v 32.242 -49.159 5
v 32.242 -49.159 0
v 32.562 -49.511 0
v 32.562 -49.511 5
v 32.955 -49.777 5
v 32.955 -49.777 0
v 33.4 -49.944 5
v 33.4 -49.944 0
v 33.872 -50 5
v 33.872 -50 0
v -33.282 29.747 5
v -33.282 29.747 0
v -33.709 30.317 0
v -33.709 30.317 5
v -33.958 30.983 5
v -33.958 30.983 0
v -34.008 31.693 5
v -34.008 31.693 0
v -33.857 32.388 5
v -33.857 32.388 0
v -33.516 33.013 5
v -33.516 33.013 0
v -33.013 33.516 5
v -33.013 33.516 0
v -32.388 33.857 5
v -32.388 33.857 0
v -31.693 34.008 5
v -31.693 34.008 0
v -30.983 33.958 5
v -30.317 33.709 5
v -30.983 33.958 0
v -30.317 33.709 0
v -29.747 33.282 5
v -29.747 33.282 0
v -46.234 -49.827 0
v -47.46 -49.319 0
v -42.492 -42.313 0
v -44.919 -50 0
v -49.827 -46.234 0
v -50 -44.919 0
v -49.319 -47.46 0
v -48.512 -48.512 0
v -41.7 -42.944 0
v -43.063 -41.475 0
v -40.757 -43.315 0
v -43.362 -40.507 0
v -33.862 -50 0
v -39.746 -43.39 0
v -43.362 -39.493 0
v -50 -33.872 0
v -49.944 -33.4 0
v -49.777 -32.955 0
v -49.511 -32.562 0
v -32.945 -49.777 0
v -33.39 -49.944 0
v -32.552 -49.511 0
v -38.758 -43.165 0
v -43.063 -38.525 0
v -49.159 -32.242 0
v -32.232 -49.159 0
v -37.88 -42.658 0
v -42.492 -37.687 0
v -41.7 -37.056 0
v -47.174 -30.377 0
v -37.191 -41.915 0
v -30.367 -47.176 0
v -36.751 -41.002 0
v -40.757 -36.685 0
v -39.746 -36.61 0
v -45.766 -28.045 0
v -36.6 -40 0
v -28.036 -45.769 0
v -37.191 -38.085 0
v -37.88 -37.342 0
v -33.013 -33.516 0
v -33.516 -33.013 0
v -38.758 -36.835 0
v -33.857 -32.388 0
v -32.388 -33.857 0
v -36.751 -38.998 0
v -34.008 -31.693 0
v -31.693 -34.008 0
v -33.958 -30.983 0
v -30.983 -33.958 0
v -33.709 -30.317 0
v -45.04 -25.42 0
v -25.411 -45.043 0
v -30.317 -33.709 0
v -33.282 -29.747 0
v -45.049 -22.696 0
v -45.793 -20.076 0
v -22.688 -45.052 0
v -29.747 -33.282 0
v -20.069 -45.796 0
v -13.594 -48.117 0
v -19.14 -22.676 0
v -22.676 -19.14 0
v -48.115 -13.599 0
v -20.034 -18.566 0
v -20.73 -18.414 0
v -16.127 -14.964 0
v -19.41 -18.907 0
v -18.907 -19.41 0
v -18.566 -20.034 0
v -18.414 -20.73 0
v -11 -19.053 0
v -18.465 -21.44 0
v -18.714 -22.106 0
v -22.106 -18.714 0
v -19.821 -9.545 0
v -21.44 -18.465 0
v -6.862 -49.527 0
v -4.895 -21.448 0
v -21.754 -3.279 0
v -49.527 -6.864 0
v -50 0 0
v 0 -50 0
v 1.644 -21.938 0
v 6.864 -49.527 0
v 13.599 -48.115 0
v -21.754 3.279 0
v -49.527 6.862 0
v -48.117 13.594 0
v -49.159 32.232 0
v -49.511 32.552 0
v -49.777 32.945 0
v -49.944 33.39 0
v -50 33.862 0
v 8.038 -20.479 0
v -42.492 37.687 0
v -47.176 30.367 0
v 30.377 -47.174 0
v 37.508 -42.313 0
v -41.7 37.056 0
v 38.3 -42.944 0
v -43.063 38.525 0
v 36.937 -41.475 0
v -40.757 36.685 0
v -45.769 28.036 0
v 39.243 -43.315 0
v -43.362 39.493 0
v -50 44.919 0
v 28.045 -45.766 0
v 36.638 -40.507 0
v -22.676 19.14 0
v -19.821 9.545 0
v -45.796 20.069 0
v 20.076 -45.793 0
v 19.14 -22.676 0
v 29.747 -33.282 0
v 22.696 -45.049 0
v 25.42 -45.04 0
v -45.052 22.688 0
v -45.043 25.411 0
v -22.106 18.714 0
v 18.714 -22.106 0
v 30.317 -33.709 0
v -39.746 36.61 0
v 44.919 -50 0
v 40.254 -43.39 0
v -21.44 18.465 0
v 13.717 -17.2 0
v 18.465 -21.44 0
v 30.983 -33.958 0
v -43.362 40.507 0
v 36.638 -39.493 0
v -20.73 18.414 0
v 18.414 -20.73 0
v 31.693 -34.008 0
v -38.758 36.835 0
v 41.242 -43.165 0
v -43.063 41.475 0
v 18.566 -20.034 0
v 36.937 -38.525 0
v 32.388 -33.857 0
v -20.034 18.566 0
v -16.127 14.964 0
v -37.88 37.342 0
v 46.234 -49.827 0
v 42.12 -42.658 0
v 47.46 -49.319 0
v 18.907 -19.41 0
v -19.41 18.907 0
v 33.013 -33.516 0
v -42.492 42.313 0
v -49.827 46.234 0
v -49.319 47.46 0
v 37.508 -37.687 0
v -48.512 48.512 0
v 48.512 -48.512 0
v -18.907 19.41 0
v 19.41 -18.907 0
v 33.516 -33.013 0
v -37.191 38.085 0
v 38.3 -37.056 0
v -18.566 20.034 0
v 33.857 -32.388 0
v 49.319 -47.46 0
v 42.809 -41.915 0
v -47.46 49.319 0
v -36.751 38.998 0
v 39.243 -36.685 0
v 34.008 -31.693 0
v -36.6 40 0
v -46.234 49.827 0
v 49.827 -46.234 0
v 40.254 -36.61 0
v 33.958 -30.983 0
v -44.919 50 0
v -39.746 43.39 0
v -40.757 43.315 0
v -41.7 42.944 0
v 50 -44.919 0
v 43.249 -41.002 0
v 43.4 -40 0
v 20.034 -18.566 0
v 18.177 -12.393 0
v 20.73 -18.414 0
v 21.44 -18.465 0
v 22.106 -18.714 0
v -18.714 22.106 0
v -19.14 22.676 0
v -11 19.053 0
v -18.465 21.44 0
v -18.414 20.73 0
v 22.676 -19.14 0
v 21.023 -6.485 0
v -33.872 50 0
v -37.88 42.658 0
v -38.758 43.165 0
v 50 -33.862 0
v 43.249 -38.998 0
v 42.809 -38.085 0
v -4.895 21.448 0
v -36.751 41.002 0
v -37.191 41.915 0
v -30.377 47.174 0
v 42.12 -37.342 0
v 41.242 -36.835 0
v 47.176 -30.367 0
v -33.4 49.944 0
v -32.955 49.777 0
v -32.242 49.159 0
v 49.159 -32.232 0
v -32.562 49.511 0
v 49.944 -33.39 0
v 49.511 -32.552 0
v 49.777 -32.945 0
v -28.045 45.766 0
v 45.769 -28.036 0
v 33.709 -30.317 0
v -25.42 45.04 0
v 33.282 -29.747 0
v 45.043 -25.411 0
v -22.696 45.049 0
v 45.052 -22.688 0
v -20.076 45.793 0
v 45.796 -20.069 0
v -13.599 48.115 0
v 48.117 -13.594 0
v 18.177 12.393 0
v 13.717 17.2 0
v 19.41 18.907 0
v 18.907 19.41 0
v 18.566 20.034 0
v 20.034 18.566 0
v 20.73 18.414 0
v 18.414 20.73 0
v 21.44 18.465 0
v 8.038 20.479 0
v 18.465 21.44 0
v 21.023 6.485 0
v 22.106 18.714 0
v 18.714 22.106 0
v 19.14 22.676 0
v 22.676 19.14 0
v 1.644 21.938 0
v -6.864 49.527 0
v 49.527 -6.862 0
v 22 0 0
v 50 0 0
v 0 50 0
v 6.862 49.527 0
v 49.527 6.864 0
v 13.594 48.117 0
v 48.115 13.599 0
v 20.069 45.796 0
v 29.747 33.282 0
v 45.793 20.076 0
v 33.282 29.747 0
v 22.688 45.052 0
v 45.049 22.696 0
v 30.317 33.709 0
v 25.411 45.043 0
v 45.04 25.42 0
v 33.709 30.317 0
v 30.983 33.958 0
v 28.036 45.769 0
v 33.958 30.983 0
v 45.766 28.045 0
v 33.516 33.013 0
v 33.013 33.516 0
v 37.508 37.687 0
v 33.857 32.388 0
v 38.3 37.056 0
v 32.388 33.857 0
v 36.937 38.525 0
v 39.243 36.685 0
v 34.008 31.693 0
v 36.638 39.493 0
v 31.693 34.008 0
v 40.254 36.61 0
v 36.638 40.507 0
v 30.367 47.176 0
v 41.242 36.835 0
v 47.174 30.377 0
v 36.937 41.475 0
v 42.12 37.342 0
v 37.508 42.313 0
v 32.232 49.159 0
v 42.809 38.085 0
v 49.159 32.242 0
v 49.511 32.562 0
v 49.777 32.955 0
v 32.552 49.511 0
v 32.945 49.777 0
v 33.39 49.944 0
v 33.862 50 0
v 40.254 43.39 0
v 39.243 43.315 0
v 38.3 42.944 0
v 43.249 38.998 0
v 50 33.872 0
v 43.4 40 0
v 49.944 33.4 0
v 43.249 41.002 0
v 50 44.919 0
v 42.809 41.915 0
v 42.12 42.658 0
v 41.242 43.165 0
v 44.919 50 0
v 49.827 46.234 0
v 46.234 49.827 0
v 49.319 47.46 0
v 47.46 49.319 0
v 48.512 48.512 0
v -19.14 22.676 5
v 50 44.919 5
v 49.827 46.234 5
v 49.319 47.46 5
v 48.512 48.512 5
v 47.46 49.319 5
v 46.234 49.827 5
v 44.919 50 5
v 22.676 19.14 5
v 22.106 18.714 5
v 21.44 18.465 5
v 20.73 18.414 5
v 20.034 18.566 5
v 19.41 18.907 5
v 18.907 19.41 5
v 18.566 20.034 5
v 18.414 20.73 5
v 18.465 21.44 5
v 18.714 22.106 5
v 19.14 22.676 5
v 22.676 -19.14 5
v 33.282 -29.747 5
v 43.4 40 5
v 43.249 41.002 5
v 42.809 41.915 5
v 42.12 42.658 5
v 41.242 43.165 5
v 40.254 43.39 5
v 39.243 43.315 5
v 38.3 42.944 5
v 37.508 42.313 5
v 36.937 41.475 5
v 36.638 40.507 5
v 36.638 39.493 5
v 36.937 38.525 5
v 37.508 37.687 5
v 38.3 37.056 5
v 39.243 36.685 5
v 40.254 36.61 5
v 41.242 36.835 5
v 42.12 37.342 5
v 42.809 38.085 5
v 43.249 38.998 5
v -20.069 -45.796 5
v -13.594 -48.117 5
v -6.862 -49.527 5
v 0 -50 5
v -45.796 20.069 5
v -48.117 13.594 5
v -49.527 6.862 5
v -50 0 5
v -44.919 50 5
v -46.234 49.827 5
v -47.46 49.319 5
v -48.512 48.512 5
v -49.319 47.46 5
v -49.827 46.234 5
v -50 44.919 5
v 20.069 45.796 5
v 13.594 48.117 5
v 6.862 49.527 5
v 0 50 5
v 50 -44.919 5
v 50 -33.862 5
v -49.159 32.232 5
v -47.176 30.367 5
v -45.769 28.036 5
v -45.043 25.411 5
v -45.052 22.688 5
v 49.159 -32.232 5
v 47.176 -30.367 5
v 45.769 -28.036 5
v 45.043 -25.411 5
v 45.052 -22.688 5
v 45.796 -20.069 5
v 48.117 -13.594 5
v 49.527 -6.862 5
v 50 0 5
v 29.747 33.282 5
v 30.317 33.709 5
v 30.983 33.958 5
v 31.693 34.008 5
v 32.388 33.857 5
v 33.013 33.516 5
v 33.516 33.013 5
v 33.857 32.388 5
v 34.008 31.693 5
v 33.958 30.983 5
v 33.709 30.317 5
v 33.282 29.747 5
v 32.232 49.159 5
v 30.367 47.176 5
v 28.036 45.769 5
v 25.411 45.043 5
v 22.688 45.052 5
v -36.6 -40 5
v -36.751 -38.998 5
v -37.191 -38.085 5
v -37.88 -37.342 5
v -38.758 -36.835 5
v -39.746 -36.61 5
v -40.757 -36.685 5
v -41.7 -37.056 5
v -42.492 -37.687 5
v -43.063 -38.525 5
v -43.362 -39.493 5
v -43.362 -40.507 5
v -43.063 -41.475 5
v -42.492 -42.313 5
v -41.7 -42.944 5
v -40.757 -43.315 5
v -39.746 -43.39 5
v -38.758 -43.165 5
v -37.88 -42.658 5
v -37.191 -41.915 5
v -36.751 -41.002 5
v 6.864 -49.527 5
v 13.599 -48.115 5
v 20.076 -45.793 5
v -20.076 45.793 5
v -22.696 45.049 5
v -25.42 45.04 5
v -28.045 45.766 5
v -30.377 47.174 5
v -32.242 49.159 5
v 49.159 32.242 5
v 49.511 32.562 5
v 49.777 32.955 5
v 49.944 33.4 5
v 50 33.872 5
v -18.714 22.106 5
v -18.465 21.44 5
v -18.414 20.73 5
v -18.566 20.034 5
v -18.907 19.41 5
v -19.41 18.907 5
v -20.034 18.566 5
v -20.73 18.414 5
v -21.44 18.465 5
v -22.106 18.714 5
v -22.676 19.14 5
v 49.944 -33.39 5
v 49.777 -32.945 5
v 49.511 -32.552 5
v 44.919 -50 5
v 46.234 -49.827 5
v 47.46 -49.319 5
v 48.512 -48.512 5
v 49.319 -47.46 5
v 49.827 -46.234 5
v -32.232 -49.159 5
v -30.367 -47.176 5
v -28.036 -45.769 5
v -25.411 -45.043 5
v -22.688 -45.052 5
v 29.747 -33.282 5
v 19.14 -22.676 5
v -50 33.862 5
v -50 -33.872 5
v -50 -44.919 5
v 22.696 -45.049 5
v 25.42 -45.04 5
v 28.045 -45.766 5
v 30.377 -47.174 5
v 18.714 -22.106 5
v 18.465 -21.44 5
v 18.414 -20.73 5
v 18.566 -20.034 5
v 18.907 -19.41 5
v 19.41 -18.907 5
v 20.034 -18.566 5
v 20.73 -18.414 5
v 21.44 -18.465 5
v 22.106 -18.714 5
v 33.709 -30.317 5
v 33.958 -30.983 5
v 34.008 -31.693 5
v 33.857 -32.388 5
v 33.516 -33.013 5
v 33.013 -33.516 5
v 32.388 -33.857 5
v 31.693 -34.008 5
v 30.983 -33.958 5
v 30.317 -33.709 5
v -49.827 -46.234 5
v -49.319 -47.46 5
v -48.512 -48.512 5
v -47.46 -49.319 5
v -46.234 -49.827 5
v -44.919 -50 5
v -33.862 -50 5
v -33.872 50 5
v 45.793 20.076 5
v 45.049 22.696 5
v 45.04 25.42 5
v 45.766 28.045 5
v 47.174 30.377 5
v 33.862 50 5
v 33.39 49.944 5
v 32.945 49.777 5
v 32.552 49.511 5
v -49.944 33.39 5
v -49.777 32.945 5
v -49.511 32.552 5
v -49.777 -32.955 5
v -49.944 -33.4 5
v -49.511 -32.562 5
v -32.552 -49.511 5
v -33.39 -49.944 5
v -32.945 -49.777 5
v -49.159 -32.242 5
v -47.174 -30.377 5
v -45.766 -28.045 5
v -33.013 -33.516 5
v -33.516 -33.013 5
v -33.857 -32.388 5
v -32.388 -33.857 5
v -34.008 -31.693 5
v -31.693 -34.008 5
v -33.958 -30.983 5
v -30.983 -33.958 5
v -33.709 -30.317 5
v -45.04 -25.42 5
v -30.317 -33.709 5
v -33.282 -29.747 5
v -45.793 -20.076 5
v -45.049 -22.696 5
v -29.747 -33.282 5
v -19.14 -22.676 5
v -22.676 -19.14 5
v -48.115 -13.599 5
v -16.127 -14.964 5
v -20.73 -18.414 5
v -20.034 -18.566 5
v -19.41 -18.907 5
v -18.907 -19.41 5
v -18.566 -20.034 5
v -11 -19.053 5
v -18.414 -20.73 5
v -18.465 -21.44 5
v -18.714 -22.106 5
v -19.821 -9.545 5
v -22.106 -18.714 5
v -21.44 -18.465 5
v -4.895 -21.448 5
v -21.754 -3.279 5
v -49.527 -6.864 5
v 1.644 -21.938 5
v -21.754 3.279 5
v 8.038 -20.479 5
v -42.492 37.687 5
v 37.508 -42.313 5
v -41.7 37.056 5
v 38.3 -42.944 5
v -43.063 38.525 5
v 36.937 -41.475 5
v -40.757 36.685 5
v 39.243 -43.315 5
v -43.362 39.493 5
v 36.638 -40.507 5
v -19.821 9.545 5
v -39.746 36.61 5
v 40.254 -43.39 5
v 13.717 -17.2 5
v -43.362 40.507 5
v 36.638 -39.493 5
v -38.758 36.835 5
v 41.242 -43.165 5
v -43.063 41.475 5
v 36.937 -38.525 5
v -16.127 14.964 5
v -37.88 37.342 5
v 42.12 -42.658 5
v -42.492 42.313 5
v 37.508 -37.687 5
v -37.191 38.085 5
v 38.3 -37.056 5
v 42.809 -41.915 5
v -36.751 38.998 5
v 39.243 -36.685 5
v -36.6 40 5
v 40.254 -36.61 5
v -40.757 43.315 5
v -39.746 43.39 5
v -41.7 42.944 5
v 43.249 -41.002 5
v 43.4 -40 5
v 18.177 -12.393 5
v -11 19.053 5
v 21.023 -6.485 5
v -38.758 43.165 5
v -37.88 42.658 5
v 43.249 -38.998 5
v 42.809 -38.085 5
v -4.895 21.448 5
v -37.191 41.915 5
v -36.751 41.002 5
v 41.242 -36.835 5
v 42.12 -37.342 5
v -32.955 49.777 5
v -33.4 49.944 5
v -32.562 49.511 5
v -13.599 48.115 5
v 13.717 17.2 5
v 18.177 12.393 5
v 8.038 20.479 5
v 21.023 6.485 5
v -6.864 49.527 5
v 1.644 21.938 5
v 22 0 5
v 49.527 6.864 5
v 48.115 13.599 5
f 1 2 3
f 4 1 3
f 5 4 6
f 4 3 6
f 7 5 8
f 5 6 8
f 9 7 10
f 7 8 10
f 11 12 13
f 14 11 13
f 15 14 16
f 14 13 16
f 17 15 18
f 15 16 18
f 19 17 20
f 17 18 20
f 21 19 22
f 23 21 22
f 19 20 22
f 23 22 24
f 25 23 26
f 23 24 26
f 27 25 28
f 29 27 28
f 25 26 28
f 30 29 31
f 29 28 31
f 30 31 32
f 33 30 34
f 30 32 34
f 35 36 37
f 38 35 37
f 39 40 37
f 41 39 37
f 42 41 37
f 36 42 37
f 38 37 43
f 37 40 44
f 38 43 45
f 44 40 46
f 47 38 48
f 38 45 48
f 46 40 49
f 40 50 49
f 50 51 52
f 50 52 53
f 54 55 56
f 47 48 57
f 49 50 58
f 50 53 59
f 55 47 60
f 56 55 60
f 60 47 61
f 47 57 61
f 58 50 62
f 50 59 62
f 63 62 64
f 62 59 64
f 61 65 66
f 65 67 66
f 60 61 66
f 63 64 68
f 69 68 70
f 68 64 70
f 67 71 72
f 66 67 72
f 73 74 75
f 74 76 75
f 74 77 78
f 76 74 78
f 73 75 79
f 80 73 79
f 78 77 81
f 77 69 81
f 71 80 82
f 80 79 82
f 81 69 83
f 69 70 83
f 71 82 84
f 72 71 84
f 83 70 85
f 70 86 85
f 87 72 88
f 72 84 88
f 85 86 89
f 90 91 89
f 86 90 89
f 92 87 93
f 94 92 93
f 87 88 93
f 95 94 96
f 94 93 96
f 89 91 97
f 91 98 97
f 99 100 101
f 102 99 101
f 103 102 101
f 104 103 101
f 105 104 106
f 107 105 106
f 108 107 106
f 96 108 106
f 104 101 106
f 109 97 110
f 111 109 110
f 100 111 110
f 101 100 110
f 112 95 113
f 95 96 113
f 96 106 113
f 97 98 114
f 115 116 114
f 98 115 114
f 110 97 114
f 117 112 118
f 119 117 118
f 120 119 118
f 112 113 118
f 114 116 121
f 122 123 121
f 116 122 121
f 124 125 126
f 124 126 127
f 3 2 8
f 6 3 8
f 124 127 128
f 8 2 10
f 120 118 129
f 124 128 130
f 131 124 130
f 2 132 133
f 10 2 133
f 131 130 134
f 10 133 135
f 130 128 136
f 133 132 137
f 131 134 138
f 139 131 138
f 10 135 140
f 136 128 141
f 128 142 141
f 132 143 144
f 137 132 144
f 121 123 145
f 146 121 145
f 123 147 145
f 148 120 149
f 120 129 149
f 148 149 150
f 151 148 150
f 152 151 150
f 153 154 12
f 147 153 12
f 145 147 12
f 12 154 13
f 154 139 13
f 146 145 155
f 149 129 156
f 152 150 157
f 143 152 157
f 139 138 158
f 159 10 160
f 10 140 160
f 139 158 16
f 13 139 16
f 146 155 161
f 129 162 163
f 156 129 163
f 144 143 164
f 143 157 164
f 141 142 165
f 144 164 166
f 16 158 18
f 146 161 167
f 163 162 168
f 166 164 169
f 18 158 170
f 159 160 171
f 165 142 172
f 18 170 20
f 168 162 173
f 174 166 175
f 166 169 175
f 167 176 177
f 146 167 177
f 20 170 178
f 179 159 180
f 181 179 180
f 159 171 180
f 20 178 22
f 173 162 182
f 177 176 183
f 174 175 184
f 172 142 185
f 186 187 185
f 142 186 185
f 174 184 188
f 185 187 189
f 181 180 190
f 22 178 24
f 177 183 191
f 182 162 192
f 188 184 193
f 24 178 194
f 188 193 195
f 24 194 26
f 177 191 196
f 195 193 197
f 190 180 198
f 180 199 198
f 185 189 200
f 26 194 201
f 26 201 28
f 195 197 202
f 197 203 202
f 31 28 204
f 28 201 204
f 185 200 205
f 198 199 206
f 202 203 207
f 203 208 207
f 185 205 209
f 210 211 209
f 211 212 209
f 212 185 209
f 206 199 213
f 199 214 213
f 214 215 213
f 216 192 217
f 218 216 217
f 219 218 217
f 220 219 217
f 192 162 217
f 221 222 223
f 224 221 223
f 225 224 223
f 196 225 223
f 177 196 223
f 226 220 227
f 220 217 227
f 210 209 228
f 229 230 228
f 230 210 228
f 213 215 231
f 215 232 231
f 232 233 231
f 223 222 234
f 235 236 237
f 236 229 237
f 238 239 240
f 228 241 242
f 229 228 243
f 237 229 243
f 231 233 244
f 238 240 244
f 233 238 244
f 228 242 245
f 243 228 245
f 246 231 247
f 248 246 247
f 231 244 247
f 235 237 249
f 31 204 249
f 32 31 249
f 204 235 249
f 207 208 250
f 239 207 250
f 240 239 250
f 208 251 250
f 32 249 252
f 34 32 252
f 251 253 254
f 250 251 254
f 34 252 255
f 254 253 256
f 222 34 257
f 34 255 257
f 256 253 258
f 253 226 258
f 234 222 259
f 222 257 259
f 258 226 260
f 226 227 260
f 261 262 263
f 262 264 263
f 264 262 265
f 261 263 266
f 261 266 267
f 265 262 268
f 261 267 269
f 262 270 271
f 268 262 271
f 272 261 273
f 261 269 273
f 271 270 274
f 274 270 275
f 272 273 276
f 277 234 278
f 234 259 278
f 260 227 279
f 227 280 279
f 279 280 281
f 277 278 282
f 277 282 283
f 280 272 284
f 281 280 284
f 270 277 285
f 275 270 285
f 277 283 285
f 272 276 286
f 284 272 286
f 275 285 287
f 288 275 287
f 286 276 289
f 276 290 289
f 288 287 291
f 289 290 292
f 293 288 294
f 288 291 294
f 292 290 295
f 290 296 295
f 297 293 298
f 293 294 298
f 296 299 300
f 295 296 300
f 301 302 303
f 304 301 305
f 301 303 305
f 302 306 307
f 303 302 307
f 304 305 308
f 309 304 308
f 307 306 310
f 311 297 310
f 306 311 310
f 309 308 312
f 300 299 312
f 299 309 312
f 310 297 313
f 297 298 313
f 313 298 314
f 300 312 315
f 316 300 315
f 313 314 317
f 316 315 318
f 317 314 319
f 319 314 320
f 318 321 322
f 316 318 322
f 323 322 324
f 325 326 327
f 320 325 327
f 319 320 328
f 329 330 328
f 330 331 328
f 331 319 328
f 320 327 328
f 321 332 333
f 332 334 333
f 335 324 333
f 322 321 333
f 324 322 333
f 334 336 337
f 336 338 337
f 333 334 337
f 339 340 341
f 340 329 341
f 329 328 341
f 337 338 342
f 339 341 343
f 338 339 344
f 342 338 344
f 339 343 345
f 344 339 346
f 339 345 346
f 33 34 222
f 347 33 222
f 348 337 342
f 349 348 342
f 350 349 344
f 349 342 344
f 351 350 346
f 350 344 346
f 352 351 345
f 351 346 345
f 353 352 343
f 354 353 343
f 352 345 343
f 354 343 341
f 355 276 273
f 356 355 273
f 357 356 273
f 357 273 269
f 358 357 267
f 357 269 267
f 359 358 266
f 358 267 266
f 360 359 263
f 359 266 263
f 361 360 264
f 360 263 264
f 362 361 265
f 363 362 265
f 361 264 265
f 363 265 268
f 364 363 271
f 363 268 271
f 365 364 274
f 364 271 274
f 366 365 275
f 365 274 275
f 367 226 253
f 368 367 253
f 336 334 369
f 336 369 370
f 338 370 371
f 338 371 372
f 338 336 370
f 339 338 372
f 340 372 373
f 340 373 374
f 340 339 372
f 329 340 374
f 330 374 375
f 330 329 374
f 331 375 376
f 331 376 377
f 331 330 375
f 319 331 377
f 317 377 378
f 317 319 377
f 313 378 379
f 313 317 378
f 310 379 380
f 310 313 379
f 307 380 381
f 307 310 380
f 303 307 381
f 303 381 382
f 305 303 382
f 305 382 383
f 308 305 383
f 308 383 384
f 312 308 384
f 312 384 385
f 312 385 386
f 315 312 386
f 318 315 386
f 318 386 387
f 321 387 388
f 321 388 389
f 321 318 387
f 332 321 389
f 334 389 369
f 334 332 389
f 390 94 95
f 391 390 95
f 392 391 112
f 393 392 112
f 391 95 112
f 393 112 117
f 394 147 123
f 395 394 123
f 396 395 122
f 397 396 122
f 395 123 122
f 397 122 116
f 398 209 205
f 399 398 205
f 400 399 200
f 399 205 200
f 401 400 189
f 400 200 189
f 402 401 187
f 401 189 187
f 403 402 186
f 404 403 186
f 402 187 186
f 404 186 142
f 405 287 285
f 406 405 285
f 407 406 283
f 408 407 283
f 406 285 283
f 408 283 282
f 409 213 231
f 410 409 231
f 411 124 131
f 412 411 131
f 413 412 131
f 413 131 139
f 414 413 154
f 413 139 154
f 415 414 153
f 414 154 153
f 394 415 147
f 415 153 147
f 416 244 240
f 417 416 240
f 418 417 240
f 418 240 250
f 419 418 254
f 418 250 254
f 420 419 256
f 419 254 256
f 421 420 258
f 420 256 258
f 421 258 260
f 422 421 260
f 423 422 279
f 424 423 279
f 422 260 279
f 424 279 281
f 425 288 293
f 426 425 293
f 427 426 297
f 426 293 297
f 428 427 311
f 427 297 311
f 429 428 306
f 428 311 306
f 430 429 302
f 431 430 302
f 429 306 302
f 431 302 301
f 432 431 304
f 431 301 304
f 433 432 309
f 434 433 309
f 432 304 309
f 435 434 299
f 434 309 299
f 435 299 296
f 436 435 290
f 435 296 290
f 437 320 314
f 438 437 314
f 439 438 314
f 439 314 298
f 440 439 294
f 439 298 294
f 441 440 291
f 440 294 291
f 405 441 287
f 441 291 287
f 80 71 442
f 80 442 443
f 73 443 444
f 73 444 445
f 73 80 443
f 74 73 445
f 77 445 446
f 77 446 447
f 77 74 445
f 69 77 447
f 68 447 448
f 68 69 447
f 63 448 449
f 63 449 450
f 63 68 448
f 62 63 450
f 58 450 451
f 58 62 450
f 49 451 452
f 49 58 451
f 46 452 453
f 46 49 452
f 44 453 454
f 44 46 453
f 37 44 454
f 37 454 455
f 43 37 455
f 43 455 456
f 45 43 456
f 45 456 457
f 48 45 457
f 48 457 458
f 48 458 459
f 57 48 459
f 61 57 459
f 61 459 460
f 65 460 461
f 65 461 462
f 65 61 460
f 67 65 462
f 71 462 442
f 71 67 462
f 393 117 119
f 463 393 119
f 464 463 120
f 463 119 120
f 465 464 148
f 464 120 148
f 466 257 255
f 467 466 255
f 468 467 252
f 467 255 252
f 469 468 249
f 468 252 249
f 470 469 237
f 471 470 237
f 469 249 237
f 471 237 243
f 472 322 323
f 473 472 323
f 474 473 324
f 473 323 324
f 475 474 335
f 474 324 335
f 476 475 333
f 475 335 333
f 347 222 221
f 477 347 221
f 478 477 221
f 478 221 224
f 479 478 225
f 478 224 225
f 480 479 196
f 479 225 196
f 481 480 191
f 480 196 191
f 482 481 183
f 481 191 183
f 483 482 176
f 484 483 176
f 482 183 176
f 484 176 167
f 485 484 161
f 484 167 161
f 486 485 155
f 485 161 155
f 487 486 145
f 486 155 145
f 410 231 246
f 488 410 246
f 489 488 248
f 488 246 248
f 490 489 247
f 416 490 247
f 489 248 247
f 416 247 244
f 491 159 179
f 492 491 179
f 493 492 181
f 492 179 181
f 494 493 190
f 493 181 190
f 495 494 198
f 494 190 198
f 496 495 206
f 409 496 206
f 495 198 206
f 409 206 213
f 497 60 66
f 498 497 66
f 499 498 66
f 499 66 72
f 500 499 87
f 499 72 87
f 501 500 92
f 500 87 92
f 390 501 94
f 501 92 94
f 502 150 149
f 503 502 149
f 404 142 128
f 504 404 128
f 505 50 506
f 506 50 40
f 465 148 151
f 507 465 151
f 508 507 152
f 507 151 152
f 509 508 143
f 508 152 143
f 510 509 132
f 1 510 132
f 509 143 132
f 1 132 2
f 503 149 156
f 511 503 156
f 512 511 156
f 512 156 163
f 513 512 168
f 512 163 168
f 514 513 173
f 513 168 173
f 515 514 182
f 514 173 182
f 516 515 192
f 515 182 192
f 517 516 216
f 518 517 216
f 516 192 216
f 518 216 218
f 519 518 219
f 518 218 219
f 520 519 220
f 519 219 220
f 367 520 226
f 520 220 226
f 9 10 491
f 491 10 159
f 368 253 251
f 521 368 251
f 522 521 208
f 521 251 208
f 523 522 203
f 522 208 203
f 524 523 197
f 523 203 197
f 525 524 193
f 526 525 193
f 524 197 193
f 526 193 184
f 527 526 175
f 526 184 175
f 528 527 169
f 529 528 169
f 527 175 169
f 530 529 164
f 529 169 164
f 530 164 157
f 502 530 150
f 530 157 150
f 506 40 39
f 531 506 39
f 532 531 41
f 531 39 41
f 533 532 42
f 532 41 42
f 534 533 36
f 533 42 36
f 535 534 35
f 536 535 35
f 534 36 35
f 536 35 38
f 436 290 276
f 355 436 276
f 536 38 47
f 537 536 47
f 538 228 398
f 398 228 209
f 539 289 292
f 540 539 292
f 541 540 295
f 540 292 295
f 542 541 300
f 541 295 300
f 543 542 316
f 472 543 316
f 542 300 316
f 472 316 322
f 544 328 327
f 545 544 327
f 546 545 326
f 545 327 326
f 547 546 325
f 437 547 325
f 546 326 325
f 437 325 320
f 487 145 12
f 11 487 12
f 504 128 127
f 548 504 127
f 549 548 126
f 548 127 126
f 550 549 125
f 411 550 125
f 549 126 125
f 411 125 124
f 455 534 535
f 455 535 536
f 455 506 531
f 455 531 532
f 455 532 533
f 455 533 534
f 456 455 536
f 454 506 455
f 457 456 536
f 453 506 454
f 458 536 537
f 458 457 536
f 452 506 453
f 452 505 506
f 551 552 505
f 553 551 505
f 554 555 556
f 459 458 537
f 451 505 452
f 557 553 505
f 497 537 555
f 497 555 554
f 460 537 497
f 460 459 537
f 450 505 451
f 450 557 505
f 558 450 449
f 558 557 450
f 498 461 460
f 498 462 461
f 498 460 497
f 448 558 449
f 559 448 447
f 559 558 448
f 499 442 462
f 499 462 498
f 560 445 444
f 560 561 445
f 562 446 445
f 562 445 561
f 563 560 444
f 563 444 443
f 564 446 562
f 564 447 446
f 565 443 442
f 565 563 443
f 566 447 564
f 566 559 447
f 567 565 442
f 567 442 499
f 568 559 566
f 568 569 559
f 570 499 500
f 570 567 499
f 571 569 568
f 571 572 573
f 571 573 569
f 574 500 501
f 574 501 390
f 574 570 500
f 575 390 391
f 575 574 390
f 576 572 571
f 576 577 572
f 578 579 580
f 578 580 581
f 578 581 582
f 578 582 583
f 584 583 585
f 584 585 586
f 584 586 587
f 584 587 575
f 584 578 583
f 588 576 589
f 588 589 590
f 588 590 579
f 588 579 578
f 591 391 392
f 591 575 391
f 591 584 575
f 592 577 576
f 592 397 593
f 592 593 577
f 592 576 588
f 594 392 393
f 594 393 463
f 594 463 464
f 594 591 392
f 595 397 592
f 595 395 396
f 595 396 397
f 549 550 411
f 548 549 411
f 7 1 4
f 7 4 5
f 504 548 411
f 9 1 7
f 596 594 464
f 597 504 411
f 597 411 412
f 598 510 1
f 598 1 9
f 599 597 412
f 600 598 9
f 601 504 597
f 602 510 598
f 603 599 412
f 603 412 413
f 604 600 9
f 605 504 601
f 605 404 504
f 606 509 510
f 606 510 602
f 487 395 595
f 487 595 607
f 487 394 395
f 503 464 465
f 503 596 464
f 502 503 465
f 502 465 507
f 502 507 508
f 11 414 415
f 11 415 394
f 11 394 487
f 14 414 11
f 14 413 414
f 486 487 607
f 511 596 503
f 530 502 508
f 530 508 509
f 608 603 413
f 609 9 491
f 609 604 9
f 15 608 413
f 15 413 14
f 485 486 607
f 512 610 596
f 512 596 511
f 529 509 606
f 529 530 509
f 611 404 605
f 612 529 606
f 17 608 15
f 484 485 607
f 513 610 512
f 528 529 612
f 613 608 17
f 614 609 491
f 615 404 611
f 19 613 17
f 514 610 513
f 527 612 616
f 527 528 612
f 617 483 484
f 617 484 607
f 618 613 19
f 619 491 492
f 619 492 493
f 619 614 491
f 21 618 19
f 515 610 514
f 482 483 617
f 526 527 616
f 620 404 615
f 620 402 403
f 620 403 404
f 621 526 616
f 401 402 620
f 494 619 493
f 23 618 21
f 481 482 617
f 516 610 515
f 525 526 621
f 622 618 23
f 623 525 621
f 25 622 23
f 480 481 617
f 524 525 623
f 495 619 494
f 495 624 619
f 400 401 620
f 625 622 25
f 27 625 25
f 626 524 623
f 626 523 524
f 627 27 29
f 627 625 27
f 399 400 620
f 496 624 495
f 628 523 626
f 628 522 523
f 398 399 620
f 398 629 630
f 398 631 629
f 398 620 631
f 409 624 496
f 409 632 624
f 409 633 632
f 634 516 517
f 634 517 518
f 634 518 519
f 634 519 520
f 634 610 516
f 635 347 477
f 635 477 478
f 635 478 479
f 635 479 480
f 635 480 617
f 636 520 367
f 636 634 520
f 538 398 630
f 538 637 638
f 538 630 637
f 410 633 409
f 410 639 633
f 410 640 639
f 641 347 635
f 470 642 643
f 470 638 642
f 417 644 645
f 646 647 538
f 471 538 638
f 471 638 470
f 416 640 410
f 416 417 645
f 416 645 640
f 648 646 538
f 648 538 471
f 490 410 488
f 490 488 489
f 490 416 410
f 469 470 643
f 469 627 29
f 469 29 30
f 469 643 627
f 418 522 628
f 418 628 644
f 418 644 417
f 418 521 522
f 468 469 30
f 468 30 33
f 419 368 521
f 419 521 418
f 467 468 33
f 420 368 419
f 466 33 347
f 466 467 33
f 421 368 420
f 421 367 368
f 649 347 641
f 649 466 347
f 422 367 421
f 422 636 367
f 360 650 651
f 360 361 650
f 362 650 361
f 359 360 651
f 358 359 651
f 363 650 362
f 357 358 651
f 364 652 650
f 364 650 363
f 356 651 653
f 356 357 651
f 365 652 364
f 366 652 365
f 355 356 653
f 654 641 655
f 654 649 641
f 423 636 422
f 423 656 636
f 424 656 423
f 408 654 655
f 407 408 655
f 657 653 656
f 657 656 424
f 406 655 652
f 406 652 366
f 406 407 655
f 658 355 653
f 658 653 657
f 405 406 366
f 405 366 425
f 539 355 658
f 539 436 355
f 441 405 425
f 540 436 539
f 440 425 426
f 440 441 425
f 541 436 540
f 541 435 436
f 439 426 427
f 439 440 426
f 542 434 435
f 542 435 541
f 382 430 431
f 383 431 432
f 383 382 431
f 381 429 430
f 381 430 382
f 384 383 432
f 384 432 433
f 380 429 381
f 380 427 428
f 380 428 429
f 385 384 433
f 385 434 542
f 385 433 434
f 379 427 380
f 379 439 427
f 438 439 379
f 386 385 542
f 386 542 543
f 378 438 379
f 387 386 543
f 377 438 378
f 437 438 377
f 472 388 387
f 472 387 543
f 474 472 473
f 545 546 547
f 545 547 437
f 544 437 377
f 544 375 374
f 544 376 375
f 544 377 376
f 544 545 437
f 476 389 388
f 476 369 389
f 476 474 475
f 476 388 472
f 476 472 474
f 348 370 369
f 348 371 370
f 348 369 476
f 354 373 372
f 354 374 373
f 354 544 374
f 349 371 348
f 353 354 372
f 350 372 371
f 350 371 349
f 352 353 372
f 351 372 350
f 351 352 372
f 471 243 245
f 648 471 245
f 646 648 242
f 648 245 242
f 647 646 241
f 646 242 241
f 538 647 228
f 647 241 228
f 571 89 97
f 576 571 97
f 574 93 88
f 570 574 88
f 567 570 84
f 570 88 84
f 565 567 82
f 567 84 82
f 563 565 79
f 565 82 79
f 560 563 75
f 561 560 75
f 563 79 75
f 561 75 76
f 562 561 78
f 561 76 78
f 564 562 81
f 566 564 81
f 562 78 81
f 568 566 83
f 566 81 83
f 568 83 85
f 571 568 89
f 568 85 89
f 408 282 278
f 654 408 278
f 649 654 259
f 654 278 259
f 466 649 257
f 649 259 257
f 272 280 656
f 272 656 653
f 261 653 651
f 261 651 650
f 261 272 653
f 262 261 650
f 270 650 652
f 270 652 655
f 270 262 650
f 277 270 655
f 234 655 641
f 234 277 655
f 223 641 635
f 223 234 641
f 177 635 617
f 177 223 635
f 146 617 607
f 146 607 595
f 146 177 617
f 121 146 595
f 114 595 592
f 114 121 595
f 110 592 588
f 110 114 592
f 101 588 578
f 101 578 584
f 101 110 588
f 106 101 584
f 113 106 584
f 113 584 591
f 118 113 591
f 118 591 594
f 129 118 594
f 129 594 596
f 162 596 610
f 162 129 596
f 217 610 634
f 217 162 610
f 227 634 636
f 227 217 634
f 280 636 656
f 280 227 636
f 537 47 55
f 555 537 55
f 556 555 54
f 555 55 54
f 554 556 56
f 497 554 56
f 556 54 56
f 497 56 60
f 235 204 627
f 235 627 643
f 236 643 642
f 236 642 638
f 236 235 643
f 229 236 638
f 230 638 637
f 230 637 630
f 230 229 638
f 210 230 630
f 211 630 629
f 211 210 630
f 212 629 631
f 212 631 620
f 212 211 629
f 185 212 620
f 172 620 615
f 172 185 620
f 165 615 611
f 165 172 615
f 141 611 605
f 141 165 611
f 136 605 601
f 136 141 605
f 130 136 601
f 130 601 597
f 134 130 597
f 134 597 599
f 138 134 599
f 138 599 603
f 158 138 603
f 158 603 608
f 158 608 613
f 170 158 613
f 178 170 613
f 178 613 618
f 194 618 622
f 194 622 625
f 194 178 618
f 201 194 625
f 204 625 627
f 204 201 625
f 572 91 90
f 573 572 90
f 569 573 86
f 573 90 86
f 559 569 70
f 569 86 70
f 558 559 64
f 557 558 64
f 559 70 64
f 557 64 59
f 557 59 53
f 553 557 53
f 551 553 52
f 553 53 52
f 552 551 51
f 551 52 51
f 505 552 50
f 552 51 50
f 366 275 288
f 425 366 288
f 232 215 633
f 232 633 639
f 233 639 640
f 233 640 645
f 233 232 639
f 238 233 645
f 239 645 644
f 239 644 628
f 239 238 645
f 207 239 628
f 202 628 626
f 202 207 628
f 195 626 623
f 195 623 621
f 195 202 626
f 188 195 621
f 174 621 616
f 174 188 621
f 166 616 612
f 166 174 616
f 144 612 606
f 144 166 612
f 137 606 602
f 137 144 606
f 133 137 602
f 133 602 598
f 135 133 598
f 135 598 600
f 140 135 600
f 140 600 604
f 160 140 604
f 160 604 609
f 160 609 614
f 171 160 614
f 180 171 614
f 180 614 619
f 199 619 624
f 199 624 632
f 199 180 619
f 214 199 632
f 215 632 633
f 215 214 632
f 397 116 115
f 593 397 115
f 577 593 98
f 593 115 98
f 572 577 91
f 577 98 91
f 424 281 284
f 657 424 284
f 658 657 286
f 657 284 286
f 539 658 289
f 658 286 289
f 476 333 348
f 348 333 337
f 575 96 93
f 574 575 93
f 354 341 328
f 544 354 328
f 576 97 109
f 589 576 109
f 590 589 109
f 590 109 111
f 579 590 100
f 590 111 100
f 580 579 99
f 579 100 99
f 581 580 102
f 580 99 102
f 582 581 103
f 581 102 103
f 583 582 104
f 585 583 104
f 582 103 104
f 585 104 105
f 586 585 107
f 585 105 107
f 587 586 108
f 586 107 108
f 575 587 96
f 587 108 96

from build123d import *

# Parameters (mm, degrees)
ESQUISSE1_R        = 3.4
ESQUISSE1_R_2      = 22
BOSS_EXTRU_2_DEPTH = 5


with BuildPart() as part:
    # Esquisse1 → Boss.-Extru.2 (new body)
    with BuildSketch(Plane.XY):
        with BuildLine():
            ThreePointArc((44.919487431, -50), (48.51195232, -48.51195232), (50, -44.919487431))
            Line((50, -44.919487431), (50, -33.862050579))
            ThreePointArc((50, -33.862050579), (49.777389032, -32.945051), (49.159111773, -32.232185585))
            ThreePointArc((49.159111773, -32.232185585), (45.31641316, -26.748192273), (45.795558863, -20.069050512))
            ThreePointArc((45.795558863, -20.069050512), (48.937602838, -10.252366967), (50, 0))
            ThreePointArc((50, 0), (48.936869799, 10.255865358), (45.79268903, 20.075597908))
            ThreePointArc((45.79268903, 20.075597908), (45.313248124, 26.757056992), (49.158537806, 32.242082639))
            ThreePointArc((49.158537806, 32.242082639), (49.777227562, 32.955043184), (50, 33.872355669))
            Line((50, 33.872355669), (50, 44.919487431))
            ThreePointArc((50, 44.919487431), (48.51195232, 48.51195232), (44.919487431, 50))
            Line((44.919487431, 50), (33.862050579, 50))
            ThreePointArc((33.862050579, 50), (32.945051, 49.777389032), (32.232185585, 49.159111773))
            ThreePointArc((32.232185585, 49.159111773), (26.748192273, 45.31641316), (20.069050512, 45.795558863))
            ThreePointArc((20.069050512, 45.795558863), (10.252366967, 48.937602838), (0, 50))
            ThreePointArc((0, 50), (-10.255865358, 48.936869799), (-20.075597908, 45.79268903))
            ThreePointArc((-20.075597908, 45.79268903), (-26.757056992, 45.313248124), (-32.242082639, 49.158537806))
            ThreePointArc((-32.242082639, 49.158537806), (-32.955043184, 49.777227562), (-33.872355669, 50))
            Line((-33.872355669, 50), (-44.919487431, 50))
            ThreePointArc((-44.919487431, 50), (-48.51195232, 48.51195232), (-50, 44.919487431))
            Line((-50, 44.919487431), (-50, 33.862050579))
            ThreePointArc((-50, 33.862050579), (-49.777389032, 32.945051), (-49.159111773, 32.232185585))
            ThreePointArc((-49.159111773, 32.232185585), (-45.31641316, 26.748192273), (-45.795558863, 20.069050512))
            ThreePointArc((-45.795558863, 20.069050512), (-48.937602838, 10.252366967), (-50, 0))
            ThreePointArc((-50, 0), (-48.936869799, -10.255865358), (-45.79268903, -20.075597908))
            ThreePointArc((-45.79268903, -20.075597908), (-45.313248124, -26.757056992), (-49.158537806, -32.242082639))
            ThreePointArc((-49.158537806, -32.242082639), (-49.777227562, -32.955043184), (-50, -33.872355669))
            Line((-50, -33.872355669), (-50, -44.919487431))
            ThreePointArc((-50, -44.919487431), (-48.51195232, -48.51195232), (-44.919487431, -50))
            Line((-44.919487431, -50), (-33.862050579, -50))
            ThreePointArc((-33.862050579, -50), (-32.945051, -49.777389032), (-32.232185585, -49.159111773))
            ThreePointArc((-32.232185585, -49.159111773), (-26.748192273, -45.31641316), (-20.069050512, -45.795558863))
            ThreePointArc((-20.069050512, -45.795558863), (-10.252366967, -48.937602838), (0, -50))
            ThreePointArc((0, -50), (10.255865358, -48.936869799), (20.075597908, -45.79268903))
            ThreePointArc((20.075597908, -45.79268903), (26.757056992, -45.313248124), (32.242082639, -49.158537806))
            ThreePointArc((32.242082639, -49.158537806), (32.955043184, -49.777227562), (33.872355669, -50))
            Line((33.872355669, -50), (44.919487431, -50))
        make_face()
        with Locations((-40, -40)):
            Circle(ESQUISSE1_R, mode=Mode.SUBTRACT)
        with BuildLine():
            ThreePointArc((-29.746951128, -33.282485034), (-33.282485092, -33.282485209), (-33.28248515, -29.746951244))
            Line((-33.28248515, -29.746951244), (-22.675883316, -19.14034941))
            ThreePointArc((-22.675883316, -19.14034941), (-19.14034941, -19.14034941), (-19.14034941, -22.675883316))
            Line((-19.14034941, -22.675883316), (-29.746951128, -33.282485034))
        make_face(mode=Mode.SUBTRACT)
        with Locations((40, -40)):
            Circle(ESQUISSE1_R, mode=Mode.SUBTRACT)
        with BuildLine():
            ThreePointArc((33.282485034, -29.746951128), (33.282485209, -33.282485092), (29.746951244, -33.28248515))
            Line((29.746951244, -33.28248515), (19.14034941, -22.675883316))
            ThreePointArc((19.14034941, -22.675883316), (19.14034941, -19.14034941), (22.675883316, -19.14034941))
            Line((22.675883316, -19.14034941), (33.282485034, -29.746951128))
        make_face(mode=Mode.SUBTRACT)
        Circle(ESQUISSE1_R_2, mode=Mode.SUBTRACT)
        with BuildLine():
            ThreePointArc((-33.282485034, 29.746951128), (-33.282485209, 33.282485092), (-29.746951244, 33.28248515))
            Line((-29.746951244, 33.28248515), (-19.14034941, 22.675883316))
            ThreePointArc((-19.14034941, 22.675883316), (-19.14034941, 19.14034941), (-22.675883316, 19.14034941))
            Line((-22.675883316, 19.14034941), (-33.282485034, 29.746951128))
        make_face(mode=Mode.SUBTRACT)
        with Locations((-40, 40)):
            Circle(ESQUISSE1_R, mode=Mode.SUBTRACT)
        with BuildLine():
            ThreePointArc((29.746951128, 33.282485034), (33.282485092, 33.282485209), (33.28248515, 29.746951244))
            Line((33.28248515, 29.746951244), (22.675883316, 19.14034941))
            ThreePointArc((22.675883316, 19.14034941), (19.14034941, 19.14034941), (19.14034941, 22.675883316))
            Line((19.14034941, 22.675883316), (29.746951128, 33.282485034))
        make_face(mode=Mode.SUBTRACT)
        with Locations((40, 40)):
            Circle(ESQUISSE1_R, mode=Mode.SUBTRACT)
    extrude(amount=BOSS_EXTRU_2_DEPTH)


solid = part.part
